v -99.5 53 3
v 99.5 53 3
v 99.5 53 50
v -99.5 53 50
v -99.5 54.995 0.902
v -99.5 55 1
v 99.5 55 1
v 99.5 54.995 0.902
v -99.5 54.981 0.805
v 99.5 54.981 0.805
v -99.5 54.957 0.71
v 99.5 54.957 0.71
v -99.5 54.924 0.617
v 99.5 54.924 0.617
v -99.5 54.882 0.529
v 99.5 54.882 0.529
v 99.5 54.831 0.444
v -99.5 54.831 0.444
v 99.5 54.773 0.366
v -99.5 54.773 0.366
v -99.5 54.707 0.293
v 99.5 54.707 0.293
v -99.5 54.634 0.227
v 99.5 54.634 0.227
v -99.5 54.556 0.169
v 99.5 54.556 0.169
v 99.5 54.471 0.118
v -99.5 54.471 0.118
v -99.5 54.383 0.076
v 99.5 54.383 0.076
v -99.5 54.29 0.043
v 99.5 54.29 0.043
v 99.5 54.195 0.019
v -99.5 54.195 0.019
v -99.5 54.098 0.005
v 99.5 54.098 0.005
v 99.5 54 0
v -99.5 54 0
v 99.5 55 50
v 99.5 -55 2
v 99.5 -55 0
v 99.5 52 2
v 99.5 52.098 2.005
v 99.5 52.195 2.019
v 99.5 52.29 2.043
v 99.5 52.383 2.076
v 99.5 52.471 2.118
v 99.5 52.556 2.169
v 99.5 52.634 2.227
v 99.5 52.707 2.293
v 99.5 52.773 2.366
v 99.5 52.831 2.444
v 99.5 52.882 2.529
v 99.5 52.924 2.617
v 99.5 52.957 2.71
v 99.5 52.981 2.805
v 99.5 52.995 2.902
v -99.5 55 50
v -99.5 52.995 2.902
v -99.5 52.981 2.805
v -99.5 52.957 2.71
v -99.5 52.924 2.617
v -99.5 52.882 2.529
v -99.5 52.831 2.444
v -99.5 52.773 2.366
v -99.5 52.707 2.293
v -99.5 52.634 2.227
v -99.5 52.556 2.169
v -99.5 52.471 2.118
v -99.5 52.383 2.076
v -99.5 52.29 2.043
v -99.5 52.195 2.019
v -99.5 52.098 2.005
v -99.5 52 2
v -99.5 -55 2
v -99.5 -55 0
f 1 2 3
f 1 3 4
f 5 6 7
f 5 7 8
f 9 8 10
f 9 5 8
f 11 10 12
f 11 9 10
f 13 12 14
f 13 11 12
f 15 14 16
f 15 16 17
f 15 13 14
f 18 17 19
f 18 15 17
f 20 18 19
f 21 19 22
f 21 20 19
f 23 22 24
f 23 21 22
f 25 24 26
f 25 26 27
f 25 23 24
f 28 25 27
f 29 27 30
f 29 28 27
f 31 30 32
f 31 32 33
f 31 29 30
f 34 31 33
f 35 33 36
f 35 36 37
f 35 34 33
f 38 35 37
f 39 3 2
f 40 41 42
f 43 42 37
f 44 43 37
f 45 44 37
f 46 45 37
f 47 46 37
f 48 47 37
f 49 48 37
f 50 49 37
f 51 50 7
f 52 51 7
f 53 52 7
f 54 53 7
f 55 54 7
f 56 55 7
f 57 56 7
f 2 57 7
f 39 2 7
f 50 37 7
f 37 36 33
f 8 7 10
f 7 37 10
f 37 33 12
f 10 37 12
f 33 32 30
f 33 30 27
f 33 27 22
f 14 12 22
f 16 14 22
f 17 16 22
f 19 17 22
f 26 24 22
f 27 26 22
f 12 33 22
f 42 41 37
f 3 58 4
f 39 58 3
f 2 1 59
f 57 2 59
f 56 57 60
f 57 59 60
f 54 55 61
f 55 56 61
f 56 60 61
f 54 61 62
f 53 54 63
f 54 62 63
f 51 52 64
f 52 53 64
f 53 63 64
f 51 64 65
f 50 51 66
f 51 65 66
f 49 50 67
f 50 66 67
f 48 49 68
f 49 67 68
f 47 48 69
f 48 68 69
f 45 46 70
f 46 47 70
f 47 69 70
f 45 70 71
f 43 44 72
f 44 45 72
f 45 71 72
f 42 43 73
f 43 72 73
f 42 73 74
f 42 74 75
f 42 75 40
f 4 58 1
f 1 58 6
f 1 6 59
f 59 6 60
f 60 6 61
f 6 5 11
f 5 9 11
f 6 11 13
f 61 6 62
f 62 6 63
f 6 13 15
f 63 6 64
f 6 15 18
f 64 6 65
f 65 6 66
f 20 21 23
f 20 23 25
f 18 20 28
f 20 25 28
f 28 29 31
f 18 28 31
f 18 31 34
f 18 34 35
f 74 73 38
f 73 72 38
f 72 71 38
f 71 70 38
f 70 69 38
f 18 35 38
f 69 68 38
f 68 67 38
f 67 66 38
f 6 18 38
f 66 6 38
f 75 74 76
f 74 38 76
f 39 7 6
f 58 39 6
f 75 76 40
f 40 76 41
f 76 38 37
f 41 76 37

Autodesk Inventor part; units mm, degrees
ref_plane "YZ Plane" through (0, 0, 0) normal (1, 0, 0) x (0, 1, 0)
ref_plane "XZ Plane" through (0, 0, 0) normal (0, 1, 0) x (-1, 0, 0)
ref_plane "XY Plane" through (0, 0, 0) normal (0, 0, 1) x (1, 0, 0)
sketch "Sketch2" plane through (0, 0, 0) normal (0, 0, 1) x (1, 0, 0)
  line L0 (99.5, 55) -> (-99.5, 55)
  line L1 (-99.5, 55) -> (-99.5, -55)
  line L2 (-99.5, -55) -> (99.5, -55)
  line L3 (99.5, -55) -> (99.5, 55)
  line L4 (99.5, 55) -> (-99.5, -55) construction
  line L5 (-99.5, 55) -> (99.5, -55) construction
  point P0 (0, 0)
  dimension "d4" = 199
  dimension "d5" = 110
extrude "Extrusion2" add sketch "Sketch2" along normal blind 2
sketch "Sketch3" plane through (0, 0, 2) normal (0, 0, 1) x (1, 0, 0)
  line L0 (99.5, -55) -> (99.5, 55) projected
  line L1 (-99.5, 55) -> (99.5, 55)
  line L2 (99.5, 55) -> (99.5, 53)
  line L3 (99.5, 53) -> (-99.5, 53)
  line L4 (-99.5, 53) -> (-99.5, 55)
  point P0 (0, 0)
  dimension "d8" = 2
extrude "Extrusion3" add sketch "Sketch3" along normal blind 48
fillet "Fillet1" radius 1 2 edges at (0, 55, 0) (0, 53, 2)
properties part number "supply base"
